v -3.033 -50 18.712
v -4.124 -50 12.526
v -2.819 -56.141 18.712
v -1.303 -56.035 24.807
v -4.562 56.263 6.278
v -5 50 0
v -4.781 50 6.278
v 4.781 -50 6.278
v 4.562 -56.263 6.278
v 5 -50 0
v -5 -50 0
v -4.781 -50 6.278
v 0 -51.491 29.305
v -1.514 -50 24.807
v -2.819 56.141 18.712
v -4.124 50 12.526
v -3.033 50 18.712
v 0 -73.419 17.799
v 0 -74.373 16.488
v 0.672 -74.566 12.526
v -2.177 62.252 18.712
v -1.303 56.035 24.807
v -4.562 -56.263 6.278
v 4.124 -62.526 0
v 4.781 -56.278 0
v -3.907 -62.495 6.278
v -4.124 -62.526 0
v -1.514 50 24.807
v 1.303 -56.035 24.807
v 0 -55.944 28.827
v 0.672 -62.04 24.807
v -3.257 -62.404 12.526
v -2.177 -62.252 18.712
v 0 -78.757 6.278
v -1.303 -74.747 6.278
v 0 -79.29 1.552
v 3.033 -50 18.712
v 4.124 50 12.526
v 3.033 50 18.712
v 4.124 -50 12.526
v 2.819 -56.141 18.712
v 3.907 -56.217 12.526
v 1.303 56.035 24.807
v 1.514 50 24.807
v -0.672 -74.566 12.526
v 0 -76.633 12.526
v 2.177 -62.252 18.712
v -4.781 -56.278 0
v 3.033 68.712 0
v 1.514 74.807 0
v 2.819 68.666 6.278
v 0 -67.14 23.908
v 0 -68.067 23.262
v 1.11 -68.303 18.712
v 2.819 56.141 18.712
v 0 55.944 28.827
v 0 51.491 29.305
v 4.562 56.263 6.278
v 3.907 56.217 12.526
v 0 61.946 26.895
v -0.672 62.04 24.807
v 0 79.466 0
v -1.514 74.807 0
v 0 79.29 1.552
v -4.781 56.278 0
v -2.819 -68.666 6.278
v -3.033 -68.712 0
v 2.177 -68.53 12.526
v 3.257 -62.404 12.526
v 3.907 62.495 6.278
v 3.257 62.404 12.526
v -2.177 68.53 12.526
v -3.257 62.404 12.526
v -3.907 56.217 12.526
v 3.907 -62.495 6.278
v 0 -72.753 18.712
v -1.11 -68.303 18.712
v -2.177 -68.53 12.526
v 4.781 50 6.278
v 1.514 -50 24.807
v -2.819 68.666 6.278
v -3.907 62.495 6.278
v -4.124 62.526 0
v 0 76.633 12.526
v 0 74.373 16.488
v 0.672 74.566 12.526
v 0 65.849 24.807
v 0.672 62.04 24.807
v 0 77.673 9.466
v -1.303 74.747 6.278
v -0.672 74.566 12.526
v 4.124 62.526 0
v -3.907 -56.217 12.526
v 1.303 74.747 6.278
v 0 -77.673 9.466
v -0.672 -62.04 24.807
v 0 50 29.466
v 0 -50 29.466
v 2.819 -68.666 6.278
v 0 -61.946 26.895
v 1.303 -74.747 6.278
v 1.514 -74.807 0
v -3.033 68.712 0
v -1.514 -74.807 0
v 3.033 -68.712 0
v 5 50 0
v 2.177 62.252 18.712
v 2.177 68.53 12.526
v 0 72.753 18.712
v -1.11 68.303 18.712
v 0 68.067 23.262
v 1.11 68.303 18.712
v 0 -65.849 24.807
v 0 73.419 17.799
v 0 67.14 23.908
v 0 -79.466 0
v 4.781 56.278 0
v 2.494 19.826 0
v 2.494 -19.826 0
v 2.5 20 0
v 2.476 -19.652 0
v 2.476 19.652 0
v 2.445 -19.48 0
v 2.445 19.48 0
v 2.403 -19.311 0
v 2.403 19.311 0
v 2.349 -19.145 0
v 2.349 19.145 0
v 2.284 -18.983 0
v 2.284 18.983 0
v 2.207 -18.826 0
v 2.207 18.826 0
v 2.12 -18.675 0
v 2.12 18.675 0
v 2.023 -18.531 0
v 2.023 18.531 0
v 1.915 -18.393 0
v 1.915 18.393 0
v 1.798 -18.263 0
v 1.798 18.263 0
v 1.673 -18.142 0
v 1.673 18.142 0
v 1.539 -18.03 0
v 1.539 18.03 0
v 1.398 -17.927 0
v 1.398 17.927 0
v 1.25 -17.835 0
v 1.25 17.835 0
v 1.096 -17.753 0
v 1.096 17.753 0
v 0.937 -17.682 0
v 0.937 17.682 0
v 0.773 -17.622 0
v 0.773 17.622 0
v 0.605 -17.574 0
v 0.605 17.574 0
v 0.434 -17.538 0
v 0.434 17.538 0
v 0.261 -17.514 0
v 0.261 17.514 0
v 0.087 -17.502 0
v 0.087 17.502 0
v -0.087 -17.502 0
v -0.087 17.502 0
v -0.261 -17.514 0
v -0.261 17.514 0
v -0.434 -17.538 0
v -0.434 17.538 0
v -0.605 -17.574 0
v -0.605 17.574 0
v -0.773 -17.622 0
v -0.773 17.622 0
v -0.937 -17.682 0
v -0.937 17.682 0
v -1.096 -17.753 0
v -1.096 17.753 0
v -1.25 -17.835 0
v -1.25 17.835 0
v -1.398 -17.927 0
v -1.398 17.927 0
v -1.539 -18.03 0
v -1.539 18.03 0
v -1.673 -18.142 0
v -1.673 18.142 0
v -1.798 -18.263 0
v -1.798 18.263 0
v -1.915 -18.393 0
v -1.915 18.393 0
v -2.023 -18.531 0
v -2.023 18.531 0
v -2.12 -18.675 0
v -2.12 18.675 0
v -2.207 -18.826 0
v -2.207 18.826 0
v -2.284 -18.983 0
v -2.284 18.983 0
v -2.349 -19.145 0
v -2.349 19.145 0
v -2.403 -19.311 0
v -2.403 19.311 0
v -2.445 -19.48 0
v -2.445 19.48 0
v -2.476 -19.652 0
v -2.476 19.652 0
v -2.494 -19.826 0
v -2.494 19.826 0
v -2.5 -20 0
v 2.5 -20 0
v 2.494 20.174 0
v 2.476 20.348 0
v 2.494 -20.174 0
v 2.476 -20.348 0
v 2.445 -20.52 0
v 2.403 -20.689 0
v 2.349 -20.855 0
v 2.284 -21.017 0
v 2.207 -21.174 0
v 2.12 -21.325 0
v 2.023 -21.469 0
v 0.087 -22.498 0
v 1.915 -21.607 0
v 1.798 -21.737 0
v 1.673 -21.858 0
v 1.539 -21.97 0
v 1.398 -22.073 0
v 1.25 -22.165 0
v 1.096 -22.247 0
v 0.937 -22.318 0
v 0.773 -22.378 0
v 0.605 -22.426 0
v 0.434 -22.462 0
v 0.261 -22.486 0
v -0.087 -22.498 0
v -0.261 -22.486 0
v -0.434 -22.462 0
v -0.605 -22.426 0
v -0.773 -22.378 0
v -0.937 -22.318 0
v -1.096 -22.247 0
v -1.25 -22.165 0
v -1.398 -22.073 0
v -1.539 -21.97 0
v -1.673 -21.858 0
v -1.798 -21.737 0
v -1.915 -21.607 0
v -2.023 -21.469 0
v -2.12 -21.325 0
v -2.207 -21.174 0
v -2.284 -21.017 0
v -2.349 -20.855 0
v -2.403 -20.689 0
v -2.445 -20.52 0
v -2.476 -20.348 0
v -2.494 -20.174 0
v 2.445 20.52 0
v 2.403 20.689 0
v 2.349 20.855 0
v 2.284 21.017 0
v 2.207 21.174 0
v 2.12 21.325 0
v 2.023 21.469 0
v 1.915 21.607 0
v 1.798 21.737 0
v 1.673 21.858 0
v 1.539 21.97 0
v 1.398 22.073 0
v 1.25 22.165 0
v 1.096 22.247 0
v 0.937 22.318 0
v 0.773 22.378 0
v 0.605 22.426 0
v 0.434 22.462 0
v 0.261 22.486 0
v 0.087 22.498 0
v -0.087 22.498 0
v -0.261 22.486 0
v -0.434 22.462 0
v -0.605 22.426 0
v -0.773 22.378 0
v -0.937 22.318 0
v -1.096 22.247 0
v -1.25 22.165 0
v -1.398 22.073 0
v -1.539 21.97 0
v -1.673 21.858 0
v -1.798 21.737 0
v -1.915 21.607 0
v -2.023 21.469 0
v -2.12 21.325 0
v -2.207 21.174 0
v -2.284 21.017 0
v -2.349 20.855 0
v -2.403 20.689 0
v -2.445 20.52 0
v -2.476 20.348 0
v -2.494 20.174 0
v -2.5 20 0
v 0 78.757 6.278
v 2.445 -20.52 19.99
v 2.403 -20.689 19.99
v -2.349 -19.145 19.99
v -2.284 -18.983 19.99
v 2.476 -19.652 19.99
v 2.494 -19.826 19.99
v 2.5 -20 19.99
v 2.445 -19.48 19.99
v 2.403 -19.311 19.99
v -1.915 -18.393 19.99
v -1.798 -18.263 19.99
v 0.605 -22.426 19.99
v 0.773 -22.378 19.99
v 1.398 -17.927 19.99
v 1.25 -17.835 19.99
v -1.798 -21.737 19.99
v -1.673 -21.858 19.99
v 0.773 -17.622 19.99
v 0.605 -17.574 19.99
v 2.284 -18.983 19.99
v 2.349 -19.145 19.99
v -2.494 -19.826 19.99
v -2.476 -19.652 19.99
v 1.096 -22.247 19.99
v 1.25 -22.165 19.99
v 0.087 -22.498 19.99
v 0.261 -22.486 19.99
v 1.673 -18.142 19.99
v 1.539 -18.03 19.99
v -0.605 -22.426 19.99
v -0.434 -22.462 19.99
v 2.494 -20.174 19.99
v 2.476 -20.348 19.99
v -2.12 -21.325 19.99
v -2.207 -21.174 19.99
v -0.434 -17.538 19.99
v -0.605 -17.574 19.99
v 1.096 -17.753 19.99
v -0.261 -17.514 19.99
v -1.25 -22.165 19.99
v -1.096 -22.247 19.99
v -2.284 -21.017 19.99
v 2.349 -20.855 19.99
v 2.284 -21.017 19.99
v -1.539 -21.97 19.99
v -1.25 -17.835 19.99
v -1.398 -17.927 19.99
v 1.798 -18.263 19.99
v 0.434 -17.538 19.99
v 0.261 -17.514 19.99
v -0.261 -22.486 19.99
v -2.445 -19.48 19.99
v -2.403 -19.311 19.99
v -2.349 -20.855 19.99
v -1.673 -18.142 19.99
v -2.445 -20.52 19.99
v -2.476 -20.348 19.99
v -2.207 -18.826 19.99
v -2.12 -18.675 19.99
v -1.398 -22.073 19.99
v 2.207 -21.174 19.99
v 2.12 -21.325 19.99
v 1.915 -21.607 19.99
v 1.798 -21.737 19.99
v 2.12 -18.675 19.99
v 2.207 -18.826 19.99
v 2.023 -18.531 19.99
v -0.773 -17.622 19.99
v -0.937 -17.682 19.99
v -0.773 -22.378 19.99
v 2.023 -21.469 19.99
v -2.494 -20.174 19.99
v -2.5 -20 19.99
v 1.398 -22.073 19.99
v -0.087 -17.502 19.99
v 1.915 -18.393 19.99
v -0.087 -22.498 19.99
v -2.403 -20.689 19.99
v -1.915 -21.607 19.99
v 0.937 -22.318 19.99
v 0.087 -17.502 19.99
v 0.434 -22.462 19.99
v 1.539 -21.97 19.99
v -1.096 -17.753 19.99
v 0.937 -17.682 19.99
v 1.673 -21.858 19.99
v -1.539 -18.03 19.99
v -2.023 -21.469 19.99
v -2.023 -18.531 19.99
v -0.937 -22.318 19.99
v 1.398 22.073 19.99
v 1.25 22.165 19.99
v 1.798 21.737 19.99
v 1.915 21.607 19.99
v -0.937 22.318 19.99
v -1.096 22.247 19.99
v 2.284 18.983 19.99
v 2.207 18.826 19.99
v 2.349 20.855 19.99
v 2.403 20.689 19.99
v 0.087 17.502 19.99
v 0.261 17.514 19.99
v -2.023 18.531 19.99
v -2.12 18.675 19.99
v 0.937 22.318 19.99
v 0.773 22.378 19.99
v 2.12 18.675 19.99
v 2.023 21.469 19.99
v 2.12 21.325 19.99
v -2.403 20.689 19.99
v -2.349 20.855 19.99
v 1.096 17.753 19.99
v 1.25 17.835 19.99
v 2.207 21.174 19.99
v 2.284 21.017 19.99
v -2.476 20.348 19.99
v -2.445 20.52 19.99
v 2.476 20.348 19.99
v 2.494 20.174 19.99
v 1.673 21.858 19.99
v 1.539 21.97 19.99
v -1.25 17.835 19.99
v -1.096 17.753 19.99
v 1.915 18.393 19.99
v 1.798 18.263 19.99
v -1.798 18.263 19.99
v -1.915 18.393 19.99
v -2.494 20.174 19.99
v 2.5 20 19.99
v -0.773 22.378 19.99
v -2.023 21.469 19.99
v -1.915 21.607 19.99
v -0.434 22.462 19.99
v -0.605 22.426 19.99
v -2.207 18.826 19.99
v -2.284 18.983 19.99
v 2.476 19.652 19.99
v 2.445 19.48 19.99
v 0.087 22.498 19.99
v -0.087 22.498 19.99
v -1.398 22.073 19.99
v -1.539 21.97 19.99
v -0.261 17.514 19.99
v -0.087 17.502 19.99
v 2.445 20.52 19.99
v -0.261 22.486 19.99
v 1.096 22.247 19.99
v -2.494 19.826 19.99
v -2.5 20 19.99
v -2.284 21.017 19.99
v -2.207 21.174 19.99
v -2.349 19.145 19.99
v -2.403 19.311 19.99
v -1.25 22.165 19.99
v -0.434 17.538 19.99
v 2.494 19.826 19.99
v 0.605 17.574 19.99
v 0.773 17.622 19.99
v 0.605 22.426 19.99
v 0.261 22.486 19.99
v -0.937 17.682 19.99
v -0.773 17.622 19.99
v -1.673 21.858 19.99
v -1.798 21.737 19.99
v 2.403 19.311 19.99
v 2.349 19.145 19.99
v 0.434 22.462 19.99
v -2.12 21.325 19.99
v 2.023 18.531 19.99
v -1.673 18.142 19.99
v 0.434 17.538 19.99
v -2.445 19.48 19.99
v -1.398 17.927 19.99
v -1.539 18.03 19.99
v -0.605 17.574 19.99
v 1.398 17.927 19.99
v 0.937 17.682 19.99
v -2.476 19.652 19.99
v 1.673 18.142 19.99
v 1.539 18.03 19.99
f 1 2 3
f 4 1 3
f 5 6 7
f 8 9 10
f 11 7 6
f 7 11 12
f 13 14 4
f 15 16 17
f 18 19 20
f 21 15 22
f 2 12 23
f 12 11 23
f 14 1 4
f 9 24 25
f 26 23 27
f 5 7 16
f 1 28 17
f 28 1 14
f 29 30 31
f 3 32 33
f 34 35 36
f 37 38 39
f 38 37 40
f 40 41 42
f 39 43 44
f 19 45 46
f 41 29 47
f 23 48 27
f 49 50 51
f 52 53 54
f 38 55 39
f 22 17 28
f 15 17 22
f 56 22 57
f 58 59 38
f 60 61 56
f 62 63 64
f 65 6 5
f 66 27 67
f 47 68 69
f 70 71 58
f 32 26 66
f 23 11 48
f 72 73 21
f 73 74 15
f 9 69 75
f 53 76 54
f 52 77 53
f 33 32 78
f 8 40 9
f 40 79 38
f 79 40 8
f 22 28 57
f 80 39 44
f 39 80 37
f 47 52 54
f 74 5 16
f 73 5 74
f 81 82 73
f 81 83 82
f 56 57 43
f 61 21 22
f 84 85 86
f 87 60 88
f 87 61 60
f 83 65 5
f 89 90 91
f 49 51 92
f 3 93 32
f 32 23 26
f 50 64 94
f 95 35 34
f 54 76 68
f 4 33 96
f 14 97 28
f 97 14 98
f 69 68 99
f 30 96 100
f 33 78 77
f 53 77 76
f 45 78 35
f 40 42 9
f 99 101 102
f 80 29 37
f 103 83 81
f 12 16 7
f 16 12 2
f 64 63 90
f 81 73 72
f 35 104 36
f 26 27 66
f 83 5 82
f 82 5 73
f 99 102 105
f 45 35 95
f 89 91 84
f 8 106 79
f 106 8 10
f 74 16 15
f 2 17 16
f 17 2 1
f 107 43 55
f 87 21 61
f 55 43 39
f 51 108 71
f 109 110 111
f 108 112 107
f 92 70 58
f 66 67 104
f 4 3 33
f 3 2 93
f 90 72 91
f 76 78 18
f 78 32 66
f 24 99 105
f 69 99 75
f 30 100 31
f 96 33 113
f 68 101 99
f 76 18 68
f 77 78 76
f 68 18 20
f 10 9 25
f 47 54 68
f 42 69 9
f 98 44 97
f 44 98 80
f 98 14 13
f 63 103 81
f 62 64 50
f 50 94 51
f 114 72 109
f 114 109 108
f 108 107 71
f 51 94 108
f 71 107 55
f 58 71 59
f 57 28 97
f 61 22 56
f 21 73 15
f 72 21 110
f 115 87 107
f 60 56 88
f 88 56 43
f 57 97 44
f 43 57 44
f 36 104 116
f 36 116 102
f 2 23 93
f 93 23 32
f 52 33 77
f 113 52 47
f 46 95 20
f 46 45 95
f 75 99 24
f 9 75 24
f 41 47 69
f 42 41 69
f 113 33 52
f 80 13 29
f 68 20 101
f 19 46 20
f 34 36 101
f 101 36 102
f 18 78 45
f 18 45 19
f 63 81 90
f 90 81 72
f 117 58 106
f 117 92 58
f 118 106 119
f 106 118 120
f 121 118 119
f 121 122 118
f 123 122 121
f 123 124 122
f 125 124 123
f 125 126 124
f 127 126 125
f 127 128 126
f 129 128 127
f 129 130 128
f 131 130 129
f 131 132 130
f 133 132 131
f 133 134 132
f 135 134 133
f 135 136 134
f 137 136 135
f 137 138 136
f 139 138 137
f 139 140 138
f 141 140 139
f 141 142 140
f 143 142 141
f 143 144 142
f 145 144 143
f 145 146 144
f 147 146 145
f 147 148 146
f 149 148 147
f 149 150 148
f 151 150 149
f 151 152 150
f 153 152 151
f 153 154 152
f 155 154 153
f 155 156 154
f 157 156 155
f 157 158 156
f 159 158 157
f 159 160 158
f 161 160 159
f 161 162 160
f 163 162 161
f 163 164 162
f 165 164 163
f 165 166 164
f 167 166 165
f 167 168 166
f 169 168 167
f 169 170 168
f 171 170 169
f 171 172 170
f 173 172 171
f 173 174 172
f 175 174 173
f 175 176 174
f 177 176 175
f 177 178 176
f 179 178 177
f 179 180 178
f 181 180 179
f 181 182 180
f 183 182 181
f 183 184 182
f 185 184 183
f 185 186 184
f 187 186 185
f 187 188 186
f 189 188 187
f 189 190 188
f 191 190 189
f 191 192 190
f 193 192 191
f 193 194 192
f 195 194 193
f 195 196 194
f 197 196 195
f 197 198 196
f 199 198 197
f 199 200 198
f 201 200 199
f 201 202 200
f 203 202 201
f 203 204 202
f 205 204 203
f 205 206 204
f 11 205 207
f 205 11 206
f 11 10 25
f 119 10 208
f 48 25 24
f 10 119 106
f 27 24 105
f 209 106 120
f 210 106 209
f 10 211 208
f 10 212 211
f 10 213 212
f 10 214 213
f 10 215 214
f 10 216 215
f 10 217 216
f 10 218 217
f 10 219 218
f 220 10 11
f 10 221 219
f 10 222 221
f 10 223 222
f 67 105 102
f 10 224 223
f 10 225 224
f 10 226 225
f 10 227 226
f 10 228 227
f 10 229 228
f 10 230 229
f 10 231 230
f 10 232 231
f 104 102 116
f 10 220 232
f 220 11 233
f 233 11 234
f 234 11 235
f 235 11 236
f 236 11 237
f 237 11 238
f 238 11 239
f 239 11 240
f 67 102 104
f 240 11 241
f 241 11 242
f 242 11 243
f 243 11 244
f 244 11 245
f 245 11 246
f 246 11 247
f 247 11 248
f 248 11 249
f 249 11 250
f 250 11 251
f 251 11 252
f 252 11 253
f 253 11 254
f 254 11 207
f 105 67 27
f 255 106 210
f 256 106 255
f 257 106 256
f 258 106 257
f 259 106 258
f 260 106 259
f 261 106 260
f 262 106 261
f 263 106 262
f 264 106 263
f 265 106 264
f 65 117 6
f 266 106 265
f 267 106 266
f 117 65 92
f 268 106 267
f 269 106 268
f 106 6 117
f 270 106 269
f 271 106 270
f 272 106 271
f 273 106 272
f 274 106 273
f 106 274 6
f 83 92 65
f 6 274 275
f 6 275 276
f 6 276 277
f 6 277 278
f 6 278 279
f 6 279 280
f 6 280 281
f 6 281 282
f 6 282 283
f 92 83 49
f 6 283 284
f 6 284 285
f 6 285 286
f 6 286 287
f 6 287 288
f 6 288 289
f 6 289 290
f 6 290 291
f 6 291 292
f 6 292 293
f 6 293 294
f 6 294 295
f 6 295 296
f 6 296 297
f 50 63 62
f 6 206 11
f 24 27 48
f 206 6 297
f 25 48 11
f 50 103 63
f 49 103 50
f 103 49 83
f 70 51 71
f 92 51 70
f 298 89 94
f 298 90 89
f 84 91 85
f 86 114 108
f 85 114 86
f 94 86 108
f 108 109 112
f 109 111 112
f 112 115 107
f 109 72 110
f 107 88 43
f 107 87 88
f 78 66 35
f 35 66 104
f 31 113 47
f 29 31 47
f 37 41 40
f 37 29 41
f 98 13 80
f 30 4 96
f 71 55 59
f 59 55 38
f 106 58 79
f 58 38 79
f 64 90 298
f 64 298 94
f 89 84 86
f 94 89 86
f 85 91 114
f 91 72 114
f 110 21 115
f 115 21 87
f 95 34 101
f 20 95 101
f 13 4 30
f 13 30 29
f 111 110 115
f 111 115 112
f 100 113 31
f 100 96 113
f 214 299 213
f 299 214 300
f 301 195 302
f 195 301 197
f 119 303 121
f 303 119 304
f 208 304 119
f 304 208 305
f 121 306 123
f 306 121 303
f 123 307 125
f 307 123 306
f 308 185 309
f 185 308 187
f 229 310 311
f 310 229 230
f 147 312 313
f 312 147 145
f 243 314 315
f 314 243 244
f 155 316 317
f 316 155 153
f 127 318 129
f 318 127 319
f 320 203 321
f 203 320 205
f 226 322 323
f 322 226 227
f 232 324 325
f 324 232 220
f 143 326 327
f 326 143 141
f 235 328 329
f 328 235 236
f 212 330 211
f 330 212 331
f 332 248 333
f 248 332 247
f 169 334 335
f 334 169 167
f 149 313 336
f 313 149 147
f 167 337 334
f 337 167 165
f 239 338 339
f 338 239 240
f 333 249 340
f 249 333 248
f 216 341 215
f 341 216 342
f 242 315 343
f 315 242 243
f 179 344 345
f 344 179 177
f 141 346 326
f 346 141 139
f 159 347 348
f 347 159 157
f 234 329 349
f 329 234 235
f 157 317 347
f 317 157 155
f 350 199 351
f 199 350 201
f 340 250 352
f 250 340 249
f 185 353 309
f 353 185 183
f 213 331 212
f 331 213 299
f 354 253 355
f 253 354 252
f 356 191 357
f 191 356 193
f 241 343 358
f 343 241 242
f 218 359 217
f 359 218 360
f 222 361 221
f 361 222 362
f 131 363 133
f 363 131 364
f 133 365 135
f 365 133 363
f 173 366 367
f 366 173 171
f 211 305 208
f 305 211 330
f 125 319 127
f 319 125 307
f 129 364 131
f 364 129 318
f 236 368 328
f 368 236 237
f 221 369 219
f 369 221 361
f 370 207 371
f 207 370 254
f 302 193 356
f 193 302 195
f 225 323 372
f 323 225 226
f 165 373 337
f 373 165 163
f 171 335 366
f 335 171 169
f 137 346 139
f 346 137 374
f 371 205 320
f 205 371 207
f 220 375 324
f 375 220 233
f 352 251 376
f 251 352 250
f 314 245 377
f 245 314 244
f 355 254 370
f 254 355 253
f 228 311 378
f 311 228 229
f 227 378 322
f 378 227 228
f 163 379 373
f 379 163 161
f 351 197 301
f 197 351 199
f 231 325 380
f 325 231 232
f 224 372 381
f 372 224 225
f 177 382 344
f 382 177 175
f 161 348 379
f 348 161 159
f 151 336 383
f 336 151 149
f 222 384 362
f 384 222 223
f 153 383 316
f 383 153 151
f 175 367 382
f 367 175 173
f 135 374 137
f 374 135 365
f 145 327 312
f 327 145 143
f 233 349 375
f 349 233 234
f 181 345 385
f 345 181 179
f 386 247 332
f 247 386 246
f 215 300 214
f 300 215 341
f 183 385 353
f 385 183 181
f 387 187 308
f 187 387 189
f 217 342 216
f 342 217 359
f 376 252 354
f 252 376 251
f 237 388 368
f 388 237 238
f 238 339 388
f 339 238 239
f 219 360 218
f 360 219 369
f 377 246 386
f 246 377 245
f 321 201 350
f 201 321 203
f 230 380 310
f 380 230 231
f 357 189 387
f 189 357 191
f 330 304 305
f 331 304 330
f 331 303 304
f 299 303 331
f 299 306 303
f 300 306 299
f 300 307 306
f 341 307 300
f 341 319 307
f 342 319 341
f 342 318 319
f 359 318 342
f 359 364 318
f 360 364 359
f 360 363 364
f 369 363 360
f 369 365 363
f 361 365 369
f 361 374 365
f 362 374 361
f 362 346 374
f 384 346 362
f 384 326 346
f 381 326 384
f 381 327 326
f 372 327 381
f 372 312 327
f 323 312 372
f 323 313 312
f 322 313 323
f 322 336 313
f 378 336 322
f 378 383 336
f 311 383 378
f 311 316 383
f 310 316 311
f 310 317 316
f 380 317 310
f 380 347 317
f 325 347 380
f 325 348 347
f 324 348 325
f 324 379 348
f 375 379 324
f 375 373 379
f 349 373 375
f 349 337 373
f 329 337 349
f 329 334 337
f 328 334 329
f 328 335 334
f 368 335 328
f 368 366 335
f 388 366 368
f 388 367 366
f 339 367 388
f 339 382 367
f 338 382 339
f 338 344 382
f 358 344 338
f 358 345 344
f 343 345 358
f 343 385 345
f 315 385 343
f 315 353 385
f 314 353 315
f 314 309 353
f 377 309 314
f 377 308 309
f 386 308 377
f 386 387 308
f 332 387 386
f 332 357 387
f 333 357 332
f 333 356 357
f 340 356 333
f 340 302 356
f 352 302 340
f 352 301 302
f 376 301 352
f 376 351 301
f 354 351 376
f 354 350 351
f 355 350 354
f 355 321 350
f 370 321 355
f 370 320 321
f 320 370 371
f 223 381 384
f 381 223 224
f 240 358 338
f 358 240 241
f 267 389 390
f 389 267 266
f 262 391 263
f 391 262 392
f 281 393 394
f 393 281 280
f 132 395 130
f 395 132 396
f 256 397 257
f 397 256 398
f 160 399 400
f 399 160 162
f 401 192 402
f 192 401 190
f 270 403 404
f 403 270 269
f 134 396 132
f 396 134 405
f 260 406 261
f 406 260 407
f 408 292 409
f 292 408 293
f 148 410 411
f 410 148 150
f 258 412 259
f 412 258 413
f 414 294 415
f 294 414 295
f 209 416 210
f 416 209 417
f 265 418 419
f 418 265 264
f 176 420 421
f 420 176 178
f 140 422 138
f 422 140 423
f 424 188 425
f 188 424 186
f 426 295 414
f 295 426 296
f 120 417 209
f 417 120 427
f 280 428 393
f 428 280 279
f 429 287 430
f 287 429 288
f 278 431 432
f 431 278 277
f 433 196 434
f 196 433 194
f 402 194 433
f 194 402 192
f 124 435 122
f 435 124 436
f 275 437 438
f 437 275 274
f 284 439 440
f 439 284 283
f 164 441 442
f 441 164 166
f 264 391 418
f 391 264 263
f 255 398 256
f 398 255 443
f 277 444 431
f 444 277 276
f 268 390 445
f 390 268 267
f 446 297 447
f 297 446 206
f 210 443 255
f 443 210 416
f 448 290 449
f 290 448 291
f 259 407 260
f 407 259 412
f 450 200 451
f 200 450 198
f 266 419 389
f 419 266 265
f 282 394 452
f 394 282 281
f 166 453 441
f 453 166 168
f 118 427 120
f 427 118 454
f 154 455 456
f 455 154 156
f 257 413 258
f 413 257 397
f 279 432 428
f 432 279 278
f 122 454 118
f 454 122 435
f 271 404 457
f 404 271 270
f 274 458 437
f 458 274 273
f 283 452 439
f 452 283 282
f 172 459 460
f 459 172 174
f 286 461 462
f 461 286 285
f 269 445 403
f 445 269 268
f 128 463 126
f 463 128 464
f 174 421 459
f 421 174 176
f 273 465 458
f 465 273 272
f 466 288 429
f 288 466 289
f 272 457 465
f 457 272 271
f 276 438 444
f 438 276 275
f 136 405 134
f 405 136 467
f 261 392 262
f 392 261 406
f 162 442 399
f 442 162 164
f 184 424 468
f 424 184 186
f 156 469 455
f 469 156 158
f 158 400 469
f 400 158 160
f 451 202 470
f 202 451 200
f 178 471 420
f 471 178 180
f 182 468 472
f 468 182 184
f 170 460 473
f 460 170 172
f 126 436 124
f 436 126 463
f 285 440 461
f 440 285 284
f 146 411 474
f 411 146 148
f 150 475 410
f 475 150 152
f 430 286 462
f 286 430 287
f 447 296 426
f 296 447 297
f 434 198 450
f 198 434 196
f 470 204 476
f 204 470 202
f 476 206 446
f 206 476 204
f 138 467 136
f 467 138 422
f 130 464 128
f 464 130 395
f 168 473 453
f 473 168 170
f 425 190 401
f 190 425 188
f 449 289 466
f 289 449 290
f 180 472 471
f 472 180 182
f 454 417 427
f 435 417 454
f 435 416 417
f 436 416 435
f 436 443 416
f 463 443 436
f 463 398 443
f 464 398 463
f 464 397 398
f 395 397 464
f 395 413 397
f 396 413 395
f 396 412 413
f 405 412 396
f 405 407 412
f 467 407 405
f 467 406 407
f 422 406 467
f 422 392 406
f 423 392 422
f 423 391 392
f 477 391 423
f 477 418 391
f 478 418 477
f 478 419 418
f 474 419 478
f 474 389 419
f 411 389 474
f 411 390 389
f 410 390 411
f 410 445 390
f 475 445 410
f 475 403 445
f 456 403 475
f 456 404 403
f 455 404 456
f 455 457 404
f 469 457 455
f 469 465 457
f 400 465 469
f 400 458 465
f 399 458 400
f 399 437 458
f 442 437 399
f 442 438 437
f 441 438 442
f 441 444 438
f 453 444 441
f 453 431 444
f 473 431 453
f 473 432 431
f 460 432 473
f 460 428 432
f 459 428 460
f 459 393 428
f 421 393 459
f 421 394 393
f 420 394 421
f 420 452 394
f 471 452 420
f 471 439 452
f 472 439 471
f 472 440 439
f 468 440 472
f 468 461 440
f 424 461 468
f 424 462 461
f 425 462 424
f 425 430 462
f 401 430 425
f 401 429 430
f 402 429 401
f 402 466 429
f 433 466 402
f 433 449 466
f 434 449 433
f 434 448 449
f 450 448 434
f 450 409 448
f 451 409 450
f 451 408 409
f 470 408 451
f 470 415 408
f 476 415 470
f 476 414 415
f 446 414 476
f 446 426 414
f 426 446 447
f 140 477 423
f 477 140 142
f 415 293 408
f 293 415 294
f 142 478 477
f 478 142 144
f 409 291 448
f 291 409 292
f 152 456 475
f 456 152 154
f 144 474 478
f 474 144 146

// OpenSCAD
module edge(R,dx){
    
    intersection(){
        translate([R-dx,0,0]) sphere(R);
        translate([-R+dx,0,0]) sphere(R);
        translate([ -dx,-R,0]) cube([2*dx,R*2,R]);
    }
}


hole=20;
holeR=2.5;
holeH=20;
width=100;
R=90;
dx=5;

difference(){
    hull(){
        translate([ 0,-width/2,0]) edge(R,dx);
        translate([ 0, width/2,0]) edge(R,dx);
    }
    translate([ 0,-hole,-0.01]) cylinder(holeH,holeR,holeR);
    translate([ 0, hole,-0.01]) cylinder(holeH,holeR,holeR);
    //translate([ 0, hole,0]) edge(R,dx);
    
}
$fn=90;		
